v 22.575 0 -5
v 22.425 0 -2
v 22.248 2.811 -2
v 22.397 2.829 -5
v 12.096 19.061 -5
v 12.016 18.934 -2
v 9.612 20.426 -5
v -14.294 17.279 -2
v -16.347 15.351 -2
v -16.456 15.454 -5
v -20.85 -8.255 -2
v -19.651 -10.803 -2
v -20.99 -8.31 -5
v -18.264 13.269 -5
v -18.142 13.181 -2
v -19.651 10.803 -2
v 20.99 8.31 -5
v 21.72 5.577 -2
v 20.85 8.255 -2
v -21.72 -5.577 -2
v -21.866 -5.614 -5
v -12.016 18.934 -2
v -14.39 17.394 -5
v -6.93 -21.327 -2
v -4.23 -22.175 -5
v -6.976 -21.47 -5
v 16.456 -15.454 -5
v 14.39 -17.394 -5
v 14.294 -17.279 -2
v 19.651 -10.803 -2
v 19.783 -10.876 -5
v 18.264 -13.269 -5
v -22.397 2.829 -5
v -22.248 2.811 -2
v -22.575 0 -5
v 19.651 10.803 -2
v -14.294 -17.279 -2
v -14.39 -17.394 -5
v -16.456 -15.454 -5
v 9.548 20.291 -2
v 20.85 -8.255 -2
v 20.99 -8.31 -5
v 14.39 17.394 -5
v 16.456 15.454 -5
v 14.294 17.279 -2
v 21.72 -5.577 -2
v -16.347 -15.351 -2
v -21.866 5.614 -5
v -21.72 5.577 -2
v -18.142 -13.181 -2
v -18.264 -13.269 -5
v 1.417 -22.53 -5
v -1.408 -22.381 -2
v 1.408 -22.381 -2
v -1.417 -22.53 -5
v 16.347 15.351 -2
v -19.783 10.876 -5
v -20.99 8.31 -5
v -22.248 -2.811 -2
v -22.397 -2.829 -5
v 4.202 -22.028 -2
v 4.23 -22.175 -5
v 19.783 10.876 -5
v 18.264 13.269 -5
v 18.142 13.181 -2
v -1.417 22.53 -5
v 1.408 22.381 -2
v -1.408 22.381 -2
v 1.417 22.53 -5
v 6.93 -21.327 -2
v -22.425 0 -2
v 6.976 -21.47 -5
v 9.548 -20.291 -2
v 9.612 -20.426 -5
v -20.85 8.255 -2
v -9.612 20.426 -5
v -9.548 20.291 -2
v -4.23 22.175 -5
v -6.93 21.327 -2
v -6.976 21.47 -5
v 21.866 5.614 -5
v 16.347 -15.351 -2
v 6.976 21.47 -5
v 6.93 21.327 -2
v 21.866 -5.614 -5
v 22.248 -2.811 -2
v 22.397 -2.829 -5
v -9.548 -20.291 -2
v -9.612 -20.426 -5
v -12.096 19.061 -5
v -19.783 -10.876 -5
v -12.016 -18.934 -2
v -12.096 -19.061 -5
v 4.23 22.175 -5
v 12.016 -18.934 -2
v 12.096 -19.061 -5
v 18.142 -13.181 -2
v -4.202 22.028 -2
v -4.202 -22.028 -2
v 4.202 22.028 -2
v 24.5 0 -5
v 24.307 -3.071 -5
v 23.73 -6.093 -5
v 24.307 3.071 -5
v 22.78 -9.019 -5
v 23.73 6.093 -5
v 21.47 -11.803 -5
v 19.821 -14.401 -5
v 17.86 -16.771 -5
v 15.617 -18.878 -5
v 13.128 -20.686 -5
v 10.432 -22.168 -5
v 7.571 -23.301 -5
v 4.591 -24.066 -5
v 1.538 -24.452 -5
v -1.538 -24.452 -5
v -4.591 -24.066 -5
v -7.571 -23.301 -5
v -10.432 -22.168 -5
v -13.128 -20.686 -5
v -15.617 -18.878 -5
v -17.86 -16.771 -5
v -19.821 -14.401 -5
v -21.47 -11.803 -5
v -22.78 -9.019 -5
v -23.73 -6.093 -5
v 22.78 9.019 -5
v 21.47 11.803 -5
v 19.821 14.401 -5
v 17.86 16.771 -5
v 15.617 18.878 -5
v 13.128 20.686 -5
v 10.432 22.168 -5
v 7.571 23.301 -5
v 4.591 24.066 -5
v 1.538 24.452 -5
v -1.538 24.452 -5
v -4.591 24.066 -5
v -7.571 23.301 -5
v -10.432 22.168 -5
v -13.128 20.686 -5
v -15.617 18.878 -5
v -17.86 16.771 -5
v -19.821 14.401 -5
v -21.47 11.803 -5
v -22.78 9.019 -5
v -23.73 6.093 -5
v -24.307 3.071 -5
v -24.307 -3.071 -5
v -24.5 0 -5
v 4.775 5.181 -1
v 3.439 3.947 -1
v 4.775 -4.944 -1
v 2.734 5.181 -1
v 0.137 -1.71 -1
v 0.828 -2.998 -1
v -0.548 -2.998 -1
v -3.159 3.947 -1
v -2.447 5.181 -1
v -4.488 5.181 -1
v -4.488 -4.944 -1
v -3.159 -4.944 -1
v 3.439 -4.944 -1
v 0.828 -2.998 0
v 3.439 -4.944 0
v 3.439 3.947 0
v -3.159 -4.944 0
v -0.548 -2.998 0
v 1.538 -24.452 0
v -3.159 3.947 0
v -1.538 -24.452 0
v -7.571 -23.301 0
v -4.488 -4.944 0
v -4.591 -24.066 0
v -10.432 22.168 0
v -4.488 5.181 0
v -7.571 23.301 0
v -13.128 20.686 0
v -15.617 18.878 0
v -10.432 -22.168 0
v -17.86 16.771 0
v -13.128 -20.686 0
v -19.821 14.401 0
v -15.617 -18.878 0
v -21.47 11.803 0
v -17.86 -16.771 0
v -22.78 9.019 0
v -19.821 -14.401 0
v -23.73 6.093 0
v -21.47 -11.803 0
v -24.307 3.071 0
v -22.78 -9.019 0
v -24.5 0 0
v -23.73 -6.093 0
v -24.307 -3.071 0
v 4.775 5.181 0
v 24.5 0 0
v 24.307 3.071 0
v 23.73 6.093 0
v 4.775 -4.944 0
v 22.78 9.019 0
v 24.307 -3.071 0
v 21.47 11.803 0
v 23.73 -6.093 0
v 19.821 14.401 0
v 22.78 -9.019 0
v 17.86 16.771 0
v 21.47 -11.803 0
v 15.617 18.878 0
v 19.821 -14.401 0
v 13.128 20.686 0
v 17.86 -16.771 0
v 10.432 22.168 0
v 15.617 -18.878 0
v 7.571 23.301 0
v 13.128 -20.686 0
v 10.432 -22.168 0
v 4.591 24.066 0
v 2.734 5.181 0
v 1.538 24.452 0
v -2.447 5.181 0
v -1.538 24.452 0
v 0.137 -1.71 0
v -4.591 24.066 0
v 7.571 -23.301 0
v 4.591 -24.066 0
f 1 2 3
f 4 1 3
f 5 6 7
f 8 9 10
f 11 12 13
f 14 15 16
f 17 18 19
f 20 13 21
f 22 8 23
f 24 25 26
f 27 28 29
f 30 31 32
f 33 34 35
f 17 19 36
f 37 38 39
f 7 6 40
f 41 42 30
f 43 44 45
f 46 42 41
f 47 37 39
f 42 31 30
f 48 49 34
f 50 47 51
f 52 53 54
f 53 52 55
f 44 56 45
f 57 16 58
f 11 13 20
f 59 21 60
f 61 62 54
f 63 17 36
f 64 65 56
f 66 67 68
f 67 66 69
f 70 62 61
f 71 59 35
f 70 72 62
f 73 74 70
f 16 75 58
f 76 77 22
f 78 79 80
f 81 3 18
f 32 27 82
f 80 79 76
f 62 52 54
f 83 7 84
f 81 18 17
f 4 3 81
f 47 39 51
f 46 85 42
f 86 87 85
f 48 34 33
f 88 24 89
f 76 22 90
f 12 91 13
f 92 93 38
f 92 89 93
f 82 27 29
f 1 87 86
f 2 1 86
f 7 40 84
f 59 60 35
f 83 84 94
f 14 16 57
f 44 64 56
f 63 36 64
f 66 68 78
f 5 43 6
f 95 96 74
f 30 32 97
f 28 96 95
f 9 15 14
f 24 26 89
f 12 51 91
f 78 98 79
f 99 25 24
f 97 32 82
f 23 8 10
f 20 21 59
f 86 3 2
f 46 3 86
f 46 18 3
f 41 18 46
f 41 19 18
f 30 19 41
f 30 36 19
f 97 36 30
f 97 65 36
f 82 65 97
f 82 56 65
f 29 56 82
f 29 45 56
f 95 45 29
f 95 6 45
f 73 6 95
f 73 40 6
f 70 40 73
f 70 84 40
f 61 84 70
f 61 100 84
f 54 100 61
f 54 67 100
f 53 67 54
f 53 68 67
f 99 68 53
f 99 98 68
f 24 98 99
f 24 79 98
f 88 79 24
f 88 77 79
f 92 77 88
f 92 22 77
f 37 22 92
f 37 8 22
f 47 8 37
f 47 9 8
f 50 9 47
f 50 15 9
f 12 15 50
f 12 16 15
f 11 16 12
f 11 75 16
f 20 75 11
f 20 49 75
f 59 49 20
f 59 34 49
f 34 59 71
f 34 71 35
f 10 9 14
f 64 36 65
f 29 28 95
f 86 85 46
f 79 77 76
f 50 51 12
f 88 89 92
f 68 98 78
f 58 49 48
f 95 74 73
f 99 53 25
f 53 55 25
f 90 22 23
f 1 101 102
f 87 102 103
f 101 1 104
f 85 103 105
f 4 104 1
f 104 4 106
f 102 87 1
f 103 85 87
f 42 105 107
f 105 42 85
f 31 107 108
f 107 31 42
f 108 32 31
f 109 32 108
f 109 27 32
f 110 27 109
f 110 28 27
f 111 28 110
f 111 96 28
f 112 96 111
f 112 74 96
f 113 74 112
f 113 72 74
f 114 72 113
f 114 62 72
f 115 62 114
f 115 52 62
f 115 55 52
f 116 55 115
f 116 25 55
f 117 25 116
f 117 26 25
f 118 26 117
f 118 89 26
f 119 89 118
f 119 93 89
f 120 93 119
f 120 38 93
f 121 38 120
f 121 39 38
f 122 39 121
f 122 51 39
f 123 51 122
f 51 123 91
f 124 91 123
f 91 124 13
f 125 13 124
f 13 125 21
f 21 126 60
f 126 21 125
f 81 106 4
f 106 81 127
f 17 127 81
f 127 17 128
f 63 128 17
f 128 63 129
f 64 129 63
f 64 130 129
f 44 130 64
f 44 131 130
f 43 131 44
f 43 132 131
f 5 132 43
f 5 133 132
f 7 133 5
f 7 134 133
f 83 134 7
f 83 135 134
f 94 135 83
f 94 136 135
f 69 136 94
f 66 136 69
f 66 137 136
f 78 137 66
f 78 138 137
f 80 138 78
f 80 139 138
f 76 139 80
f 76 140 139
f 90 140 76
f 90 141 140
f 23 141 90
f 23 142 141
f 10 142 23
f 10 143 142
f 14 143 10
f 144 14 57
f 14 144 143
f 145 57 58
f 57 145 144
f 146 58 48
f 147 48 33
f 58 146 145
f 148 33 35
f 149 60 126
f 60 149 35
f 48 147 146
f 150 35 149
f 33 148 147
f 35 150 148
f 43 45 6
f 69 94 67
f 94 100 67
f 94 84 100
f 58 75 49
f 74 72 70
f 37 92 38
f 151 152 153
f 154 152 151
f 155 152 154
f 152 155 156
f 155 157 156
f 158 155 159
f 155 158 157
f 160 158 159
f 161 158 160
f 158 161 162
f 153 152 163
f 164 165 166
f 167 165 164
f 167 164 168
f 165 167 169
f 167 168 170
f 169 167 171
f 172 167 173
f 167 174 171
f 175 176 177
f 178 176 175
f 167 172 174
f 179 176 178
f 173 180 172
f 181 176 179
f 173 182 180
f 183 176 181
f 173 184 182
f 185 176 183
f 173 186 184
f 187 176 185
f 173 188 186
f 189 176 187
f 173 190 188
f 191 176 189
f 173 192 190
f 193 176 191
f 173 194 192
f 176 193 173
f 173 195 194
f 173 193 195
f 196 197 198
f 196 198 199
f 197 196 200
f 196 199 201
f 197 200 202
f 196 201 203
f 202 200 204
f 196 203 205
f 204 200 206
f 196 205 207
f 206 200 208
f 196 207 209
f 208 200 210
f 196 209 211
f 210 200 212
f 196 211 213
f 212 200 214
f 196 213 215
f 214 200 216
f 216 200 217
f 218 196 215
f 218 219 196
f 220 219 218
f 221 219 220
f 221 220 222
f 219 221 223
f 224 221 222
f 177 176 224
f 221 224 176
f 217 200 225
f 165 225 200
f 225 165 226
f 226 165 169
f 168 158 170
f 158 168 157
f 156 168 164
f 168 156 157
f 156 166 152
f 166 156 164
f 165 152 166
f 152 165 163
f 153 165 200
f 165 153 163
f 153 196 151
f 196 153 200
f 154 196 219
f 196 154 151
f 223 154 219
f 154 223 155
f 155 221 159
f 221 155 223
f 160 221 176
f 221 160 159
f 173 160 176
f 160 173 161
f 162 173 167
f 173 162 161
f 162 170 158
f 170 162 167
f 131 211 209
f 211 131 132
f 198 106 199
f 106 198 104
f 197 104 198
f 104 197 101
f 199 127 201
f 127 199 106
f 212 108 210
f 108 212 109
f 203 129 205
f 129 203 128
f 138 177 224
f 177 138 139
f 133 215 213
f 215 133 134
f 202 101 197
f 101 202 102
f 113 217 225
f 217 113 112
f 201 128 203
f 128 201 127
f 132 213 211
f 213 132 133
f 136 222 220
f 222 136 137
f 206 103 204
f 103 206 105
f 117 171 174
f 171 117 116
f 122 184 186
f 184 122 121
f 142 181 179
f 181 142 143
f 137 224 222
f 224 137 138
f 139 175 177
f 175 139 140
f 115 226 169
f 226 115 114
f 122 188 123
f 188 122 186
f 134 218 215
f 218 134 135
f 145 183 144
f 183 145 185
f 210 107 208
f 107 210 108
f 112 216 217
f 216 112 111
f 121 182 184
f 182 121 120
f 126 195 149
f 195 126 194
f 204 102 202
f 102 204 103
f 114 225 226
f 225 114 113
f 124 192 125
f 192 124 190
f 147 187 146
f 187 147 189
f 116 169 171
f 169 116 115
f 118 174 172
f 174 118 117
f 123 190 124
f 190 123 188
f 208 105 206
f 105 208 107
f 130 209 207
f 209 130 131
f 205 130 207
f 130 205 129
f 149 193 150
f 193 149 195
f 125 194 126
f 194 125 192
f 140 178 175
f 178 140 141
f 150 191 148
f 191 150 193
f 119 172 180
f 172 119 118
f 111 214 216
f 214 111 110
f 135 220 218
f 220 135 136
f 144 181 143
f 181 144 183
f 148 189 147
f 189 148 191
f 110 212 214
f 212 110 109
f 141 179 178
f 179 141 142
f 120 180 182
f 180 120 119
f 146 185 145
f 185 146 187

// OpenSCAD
$fn = 50;

difference() {
	union() {
		translate(v = [0, 0, -5.0]) {
			cylinder(h = 5, r = 24.5);
		}
	}
	union() {
		#translate(v = [0, 0, -5.0]) {
			cylinder(h = 3, r1 = 22.575, r2 = 22.425);
		}
		translate(v = [0, 0, -1]) {
			linear_extrude(height = 1) {
				text(font = "Impact", halign = "center", size = 10, text = "M", valign = "center");
			}
		}
	}
}
